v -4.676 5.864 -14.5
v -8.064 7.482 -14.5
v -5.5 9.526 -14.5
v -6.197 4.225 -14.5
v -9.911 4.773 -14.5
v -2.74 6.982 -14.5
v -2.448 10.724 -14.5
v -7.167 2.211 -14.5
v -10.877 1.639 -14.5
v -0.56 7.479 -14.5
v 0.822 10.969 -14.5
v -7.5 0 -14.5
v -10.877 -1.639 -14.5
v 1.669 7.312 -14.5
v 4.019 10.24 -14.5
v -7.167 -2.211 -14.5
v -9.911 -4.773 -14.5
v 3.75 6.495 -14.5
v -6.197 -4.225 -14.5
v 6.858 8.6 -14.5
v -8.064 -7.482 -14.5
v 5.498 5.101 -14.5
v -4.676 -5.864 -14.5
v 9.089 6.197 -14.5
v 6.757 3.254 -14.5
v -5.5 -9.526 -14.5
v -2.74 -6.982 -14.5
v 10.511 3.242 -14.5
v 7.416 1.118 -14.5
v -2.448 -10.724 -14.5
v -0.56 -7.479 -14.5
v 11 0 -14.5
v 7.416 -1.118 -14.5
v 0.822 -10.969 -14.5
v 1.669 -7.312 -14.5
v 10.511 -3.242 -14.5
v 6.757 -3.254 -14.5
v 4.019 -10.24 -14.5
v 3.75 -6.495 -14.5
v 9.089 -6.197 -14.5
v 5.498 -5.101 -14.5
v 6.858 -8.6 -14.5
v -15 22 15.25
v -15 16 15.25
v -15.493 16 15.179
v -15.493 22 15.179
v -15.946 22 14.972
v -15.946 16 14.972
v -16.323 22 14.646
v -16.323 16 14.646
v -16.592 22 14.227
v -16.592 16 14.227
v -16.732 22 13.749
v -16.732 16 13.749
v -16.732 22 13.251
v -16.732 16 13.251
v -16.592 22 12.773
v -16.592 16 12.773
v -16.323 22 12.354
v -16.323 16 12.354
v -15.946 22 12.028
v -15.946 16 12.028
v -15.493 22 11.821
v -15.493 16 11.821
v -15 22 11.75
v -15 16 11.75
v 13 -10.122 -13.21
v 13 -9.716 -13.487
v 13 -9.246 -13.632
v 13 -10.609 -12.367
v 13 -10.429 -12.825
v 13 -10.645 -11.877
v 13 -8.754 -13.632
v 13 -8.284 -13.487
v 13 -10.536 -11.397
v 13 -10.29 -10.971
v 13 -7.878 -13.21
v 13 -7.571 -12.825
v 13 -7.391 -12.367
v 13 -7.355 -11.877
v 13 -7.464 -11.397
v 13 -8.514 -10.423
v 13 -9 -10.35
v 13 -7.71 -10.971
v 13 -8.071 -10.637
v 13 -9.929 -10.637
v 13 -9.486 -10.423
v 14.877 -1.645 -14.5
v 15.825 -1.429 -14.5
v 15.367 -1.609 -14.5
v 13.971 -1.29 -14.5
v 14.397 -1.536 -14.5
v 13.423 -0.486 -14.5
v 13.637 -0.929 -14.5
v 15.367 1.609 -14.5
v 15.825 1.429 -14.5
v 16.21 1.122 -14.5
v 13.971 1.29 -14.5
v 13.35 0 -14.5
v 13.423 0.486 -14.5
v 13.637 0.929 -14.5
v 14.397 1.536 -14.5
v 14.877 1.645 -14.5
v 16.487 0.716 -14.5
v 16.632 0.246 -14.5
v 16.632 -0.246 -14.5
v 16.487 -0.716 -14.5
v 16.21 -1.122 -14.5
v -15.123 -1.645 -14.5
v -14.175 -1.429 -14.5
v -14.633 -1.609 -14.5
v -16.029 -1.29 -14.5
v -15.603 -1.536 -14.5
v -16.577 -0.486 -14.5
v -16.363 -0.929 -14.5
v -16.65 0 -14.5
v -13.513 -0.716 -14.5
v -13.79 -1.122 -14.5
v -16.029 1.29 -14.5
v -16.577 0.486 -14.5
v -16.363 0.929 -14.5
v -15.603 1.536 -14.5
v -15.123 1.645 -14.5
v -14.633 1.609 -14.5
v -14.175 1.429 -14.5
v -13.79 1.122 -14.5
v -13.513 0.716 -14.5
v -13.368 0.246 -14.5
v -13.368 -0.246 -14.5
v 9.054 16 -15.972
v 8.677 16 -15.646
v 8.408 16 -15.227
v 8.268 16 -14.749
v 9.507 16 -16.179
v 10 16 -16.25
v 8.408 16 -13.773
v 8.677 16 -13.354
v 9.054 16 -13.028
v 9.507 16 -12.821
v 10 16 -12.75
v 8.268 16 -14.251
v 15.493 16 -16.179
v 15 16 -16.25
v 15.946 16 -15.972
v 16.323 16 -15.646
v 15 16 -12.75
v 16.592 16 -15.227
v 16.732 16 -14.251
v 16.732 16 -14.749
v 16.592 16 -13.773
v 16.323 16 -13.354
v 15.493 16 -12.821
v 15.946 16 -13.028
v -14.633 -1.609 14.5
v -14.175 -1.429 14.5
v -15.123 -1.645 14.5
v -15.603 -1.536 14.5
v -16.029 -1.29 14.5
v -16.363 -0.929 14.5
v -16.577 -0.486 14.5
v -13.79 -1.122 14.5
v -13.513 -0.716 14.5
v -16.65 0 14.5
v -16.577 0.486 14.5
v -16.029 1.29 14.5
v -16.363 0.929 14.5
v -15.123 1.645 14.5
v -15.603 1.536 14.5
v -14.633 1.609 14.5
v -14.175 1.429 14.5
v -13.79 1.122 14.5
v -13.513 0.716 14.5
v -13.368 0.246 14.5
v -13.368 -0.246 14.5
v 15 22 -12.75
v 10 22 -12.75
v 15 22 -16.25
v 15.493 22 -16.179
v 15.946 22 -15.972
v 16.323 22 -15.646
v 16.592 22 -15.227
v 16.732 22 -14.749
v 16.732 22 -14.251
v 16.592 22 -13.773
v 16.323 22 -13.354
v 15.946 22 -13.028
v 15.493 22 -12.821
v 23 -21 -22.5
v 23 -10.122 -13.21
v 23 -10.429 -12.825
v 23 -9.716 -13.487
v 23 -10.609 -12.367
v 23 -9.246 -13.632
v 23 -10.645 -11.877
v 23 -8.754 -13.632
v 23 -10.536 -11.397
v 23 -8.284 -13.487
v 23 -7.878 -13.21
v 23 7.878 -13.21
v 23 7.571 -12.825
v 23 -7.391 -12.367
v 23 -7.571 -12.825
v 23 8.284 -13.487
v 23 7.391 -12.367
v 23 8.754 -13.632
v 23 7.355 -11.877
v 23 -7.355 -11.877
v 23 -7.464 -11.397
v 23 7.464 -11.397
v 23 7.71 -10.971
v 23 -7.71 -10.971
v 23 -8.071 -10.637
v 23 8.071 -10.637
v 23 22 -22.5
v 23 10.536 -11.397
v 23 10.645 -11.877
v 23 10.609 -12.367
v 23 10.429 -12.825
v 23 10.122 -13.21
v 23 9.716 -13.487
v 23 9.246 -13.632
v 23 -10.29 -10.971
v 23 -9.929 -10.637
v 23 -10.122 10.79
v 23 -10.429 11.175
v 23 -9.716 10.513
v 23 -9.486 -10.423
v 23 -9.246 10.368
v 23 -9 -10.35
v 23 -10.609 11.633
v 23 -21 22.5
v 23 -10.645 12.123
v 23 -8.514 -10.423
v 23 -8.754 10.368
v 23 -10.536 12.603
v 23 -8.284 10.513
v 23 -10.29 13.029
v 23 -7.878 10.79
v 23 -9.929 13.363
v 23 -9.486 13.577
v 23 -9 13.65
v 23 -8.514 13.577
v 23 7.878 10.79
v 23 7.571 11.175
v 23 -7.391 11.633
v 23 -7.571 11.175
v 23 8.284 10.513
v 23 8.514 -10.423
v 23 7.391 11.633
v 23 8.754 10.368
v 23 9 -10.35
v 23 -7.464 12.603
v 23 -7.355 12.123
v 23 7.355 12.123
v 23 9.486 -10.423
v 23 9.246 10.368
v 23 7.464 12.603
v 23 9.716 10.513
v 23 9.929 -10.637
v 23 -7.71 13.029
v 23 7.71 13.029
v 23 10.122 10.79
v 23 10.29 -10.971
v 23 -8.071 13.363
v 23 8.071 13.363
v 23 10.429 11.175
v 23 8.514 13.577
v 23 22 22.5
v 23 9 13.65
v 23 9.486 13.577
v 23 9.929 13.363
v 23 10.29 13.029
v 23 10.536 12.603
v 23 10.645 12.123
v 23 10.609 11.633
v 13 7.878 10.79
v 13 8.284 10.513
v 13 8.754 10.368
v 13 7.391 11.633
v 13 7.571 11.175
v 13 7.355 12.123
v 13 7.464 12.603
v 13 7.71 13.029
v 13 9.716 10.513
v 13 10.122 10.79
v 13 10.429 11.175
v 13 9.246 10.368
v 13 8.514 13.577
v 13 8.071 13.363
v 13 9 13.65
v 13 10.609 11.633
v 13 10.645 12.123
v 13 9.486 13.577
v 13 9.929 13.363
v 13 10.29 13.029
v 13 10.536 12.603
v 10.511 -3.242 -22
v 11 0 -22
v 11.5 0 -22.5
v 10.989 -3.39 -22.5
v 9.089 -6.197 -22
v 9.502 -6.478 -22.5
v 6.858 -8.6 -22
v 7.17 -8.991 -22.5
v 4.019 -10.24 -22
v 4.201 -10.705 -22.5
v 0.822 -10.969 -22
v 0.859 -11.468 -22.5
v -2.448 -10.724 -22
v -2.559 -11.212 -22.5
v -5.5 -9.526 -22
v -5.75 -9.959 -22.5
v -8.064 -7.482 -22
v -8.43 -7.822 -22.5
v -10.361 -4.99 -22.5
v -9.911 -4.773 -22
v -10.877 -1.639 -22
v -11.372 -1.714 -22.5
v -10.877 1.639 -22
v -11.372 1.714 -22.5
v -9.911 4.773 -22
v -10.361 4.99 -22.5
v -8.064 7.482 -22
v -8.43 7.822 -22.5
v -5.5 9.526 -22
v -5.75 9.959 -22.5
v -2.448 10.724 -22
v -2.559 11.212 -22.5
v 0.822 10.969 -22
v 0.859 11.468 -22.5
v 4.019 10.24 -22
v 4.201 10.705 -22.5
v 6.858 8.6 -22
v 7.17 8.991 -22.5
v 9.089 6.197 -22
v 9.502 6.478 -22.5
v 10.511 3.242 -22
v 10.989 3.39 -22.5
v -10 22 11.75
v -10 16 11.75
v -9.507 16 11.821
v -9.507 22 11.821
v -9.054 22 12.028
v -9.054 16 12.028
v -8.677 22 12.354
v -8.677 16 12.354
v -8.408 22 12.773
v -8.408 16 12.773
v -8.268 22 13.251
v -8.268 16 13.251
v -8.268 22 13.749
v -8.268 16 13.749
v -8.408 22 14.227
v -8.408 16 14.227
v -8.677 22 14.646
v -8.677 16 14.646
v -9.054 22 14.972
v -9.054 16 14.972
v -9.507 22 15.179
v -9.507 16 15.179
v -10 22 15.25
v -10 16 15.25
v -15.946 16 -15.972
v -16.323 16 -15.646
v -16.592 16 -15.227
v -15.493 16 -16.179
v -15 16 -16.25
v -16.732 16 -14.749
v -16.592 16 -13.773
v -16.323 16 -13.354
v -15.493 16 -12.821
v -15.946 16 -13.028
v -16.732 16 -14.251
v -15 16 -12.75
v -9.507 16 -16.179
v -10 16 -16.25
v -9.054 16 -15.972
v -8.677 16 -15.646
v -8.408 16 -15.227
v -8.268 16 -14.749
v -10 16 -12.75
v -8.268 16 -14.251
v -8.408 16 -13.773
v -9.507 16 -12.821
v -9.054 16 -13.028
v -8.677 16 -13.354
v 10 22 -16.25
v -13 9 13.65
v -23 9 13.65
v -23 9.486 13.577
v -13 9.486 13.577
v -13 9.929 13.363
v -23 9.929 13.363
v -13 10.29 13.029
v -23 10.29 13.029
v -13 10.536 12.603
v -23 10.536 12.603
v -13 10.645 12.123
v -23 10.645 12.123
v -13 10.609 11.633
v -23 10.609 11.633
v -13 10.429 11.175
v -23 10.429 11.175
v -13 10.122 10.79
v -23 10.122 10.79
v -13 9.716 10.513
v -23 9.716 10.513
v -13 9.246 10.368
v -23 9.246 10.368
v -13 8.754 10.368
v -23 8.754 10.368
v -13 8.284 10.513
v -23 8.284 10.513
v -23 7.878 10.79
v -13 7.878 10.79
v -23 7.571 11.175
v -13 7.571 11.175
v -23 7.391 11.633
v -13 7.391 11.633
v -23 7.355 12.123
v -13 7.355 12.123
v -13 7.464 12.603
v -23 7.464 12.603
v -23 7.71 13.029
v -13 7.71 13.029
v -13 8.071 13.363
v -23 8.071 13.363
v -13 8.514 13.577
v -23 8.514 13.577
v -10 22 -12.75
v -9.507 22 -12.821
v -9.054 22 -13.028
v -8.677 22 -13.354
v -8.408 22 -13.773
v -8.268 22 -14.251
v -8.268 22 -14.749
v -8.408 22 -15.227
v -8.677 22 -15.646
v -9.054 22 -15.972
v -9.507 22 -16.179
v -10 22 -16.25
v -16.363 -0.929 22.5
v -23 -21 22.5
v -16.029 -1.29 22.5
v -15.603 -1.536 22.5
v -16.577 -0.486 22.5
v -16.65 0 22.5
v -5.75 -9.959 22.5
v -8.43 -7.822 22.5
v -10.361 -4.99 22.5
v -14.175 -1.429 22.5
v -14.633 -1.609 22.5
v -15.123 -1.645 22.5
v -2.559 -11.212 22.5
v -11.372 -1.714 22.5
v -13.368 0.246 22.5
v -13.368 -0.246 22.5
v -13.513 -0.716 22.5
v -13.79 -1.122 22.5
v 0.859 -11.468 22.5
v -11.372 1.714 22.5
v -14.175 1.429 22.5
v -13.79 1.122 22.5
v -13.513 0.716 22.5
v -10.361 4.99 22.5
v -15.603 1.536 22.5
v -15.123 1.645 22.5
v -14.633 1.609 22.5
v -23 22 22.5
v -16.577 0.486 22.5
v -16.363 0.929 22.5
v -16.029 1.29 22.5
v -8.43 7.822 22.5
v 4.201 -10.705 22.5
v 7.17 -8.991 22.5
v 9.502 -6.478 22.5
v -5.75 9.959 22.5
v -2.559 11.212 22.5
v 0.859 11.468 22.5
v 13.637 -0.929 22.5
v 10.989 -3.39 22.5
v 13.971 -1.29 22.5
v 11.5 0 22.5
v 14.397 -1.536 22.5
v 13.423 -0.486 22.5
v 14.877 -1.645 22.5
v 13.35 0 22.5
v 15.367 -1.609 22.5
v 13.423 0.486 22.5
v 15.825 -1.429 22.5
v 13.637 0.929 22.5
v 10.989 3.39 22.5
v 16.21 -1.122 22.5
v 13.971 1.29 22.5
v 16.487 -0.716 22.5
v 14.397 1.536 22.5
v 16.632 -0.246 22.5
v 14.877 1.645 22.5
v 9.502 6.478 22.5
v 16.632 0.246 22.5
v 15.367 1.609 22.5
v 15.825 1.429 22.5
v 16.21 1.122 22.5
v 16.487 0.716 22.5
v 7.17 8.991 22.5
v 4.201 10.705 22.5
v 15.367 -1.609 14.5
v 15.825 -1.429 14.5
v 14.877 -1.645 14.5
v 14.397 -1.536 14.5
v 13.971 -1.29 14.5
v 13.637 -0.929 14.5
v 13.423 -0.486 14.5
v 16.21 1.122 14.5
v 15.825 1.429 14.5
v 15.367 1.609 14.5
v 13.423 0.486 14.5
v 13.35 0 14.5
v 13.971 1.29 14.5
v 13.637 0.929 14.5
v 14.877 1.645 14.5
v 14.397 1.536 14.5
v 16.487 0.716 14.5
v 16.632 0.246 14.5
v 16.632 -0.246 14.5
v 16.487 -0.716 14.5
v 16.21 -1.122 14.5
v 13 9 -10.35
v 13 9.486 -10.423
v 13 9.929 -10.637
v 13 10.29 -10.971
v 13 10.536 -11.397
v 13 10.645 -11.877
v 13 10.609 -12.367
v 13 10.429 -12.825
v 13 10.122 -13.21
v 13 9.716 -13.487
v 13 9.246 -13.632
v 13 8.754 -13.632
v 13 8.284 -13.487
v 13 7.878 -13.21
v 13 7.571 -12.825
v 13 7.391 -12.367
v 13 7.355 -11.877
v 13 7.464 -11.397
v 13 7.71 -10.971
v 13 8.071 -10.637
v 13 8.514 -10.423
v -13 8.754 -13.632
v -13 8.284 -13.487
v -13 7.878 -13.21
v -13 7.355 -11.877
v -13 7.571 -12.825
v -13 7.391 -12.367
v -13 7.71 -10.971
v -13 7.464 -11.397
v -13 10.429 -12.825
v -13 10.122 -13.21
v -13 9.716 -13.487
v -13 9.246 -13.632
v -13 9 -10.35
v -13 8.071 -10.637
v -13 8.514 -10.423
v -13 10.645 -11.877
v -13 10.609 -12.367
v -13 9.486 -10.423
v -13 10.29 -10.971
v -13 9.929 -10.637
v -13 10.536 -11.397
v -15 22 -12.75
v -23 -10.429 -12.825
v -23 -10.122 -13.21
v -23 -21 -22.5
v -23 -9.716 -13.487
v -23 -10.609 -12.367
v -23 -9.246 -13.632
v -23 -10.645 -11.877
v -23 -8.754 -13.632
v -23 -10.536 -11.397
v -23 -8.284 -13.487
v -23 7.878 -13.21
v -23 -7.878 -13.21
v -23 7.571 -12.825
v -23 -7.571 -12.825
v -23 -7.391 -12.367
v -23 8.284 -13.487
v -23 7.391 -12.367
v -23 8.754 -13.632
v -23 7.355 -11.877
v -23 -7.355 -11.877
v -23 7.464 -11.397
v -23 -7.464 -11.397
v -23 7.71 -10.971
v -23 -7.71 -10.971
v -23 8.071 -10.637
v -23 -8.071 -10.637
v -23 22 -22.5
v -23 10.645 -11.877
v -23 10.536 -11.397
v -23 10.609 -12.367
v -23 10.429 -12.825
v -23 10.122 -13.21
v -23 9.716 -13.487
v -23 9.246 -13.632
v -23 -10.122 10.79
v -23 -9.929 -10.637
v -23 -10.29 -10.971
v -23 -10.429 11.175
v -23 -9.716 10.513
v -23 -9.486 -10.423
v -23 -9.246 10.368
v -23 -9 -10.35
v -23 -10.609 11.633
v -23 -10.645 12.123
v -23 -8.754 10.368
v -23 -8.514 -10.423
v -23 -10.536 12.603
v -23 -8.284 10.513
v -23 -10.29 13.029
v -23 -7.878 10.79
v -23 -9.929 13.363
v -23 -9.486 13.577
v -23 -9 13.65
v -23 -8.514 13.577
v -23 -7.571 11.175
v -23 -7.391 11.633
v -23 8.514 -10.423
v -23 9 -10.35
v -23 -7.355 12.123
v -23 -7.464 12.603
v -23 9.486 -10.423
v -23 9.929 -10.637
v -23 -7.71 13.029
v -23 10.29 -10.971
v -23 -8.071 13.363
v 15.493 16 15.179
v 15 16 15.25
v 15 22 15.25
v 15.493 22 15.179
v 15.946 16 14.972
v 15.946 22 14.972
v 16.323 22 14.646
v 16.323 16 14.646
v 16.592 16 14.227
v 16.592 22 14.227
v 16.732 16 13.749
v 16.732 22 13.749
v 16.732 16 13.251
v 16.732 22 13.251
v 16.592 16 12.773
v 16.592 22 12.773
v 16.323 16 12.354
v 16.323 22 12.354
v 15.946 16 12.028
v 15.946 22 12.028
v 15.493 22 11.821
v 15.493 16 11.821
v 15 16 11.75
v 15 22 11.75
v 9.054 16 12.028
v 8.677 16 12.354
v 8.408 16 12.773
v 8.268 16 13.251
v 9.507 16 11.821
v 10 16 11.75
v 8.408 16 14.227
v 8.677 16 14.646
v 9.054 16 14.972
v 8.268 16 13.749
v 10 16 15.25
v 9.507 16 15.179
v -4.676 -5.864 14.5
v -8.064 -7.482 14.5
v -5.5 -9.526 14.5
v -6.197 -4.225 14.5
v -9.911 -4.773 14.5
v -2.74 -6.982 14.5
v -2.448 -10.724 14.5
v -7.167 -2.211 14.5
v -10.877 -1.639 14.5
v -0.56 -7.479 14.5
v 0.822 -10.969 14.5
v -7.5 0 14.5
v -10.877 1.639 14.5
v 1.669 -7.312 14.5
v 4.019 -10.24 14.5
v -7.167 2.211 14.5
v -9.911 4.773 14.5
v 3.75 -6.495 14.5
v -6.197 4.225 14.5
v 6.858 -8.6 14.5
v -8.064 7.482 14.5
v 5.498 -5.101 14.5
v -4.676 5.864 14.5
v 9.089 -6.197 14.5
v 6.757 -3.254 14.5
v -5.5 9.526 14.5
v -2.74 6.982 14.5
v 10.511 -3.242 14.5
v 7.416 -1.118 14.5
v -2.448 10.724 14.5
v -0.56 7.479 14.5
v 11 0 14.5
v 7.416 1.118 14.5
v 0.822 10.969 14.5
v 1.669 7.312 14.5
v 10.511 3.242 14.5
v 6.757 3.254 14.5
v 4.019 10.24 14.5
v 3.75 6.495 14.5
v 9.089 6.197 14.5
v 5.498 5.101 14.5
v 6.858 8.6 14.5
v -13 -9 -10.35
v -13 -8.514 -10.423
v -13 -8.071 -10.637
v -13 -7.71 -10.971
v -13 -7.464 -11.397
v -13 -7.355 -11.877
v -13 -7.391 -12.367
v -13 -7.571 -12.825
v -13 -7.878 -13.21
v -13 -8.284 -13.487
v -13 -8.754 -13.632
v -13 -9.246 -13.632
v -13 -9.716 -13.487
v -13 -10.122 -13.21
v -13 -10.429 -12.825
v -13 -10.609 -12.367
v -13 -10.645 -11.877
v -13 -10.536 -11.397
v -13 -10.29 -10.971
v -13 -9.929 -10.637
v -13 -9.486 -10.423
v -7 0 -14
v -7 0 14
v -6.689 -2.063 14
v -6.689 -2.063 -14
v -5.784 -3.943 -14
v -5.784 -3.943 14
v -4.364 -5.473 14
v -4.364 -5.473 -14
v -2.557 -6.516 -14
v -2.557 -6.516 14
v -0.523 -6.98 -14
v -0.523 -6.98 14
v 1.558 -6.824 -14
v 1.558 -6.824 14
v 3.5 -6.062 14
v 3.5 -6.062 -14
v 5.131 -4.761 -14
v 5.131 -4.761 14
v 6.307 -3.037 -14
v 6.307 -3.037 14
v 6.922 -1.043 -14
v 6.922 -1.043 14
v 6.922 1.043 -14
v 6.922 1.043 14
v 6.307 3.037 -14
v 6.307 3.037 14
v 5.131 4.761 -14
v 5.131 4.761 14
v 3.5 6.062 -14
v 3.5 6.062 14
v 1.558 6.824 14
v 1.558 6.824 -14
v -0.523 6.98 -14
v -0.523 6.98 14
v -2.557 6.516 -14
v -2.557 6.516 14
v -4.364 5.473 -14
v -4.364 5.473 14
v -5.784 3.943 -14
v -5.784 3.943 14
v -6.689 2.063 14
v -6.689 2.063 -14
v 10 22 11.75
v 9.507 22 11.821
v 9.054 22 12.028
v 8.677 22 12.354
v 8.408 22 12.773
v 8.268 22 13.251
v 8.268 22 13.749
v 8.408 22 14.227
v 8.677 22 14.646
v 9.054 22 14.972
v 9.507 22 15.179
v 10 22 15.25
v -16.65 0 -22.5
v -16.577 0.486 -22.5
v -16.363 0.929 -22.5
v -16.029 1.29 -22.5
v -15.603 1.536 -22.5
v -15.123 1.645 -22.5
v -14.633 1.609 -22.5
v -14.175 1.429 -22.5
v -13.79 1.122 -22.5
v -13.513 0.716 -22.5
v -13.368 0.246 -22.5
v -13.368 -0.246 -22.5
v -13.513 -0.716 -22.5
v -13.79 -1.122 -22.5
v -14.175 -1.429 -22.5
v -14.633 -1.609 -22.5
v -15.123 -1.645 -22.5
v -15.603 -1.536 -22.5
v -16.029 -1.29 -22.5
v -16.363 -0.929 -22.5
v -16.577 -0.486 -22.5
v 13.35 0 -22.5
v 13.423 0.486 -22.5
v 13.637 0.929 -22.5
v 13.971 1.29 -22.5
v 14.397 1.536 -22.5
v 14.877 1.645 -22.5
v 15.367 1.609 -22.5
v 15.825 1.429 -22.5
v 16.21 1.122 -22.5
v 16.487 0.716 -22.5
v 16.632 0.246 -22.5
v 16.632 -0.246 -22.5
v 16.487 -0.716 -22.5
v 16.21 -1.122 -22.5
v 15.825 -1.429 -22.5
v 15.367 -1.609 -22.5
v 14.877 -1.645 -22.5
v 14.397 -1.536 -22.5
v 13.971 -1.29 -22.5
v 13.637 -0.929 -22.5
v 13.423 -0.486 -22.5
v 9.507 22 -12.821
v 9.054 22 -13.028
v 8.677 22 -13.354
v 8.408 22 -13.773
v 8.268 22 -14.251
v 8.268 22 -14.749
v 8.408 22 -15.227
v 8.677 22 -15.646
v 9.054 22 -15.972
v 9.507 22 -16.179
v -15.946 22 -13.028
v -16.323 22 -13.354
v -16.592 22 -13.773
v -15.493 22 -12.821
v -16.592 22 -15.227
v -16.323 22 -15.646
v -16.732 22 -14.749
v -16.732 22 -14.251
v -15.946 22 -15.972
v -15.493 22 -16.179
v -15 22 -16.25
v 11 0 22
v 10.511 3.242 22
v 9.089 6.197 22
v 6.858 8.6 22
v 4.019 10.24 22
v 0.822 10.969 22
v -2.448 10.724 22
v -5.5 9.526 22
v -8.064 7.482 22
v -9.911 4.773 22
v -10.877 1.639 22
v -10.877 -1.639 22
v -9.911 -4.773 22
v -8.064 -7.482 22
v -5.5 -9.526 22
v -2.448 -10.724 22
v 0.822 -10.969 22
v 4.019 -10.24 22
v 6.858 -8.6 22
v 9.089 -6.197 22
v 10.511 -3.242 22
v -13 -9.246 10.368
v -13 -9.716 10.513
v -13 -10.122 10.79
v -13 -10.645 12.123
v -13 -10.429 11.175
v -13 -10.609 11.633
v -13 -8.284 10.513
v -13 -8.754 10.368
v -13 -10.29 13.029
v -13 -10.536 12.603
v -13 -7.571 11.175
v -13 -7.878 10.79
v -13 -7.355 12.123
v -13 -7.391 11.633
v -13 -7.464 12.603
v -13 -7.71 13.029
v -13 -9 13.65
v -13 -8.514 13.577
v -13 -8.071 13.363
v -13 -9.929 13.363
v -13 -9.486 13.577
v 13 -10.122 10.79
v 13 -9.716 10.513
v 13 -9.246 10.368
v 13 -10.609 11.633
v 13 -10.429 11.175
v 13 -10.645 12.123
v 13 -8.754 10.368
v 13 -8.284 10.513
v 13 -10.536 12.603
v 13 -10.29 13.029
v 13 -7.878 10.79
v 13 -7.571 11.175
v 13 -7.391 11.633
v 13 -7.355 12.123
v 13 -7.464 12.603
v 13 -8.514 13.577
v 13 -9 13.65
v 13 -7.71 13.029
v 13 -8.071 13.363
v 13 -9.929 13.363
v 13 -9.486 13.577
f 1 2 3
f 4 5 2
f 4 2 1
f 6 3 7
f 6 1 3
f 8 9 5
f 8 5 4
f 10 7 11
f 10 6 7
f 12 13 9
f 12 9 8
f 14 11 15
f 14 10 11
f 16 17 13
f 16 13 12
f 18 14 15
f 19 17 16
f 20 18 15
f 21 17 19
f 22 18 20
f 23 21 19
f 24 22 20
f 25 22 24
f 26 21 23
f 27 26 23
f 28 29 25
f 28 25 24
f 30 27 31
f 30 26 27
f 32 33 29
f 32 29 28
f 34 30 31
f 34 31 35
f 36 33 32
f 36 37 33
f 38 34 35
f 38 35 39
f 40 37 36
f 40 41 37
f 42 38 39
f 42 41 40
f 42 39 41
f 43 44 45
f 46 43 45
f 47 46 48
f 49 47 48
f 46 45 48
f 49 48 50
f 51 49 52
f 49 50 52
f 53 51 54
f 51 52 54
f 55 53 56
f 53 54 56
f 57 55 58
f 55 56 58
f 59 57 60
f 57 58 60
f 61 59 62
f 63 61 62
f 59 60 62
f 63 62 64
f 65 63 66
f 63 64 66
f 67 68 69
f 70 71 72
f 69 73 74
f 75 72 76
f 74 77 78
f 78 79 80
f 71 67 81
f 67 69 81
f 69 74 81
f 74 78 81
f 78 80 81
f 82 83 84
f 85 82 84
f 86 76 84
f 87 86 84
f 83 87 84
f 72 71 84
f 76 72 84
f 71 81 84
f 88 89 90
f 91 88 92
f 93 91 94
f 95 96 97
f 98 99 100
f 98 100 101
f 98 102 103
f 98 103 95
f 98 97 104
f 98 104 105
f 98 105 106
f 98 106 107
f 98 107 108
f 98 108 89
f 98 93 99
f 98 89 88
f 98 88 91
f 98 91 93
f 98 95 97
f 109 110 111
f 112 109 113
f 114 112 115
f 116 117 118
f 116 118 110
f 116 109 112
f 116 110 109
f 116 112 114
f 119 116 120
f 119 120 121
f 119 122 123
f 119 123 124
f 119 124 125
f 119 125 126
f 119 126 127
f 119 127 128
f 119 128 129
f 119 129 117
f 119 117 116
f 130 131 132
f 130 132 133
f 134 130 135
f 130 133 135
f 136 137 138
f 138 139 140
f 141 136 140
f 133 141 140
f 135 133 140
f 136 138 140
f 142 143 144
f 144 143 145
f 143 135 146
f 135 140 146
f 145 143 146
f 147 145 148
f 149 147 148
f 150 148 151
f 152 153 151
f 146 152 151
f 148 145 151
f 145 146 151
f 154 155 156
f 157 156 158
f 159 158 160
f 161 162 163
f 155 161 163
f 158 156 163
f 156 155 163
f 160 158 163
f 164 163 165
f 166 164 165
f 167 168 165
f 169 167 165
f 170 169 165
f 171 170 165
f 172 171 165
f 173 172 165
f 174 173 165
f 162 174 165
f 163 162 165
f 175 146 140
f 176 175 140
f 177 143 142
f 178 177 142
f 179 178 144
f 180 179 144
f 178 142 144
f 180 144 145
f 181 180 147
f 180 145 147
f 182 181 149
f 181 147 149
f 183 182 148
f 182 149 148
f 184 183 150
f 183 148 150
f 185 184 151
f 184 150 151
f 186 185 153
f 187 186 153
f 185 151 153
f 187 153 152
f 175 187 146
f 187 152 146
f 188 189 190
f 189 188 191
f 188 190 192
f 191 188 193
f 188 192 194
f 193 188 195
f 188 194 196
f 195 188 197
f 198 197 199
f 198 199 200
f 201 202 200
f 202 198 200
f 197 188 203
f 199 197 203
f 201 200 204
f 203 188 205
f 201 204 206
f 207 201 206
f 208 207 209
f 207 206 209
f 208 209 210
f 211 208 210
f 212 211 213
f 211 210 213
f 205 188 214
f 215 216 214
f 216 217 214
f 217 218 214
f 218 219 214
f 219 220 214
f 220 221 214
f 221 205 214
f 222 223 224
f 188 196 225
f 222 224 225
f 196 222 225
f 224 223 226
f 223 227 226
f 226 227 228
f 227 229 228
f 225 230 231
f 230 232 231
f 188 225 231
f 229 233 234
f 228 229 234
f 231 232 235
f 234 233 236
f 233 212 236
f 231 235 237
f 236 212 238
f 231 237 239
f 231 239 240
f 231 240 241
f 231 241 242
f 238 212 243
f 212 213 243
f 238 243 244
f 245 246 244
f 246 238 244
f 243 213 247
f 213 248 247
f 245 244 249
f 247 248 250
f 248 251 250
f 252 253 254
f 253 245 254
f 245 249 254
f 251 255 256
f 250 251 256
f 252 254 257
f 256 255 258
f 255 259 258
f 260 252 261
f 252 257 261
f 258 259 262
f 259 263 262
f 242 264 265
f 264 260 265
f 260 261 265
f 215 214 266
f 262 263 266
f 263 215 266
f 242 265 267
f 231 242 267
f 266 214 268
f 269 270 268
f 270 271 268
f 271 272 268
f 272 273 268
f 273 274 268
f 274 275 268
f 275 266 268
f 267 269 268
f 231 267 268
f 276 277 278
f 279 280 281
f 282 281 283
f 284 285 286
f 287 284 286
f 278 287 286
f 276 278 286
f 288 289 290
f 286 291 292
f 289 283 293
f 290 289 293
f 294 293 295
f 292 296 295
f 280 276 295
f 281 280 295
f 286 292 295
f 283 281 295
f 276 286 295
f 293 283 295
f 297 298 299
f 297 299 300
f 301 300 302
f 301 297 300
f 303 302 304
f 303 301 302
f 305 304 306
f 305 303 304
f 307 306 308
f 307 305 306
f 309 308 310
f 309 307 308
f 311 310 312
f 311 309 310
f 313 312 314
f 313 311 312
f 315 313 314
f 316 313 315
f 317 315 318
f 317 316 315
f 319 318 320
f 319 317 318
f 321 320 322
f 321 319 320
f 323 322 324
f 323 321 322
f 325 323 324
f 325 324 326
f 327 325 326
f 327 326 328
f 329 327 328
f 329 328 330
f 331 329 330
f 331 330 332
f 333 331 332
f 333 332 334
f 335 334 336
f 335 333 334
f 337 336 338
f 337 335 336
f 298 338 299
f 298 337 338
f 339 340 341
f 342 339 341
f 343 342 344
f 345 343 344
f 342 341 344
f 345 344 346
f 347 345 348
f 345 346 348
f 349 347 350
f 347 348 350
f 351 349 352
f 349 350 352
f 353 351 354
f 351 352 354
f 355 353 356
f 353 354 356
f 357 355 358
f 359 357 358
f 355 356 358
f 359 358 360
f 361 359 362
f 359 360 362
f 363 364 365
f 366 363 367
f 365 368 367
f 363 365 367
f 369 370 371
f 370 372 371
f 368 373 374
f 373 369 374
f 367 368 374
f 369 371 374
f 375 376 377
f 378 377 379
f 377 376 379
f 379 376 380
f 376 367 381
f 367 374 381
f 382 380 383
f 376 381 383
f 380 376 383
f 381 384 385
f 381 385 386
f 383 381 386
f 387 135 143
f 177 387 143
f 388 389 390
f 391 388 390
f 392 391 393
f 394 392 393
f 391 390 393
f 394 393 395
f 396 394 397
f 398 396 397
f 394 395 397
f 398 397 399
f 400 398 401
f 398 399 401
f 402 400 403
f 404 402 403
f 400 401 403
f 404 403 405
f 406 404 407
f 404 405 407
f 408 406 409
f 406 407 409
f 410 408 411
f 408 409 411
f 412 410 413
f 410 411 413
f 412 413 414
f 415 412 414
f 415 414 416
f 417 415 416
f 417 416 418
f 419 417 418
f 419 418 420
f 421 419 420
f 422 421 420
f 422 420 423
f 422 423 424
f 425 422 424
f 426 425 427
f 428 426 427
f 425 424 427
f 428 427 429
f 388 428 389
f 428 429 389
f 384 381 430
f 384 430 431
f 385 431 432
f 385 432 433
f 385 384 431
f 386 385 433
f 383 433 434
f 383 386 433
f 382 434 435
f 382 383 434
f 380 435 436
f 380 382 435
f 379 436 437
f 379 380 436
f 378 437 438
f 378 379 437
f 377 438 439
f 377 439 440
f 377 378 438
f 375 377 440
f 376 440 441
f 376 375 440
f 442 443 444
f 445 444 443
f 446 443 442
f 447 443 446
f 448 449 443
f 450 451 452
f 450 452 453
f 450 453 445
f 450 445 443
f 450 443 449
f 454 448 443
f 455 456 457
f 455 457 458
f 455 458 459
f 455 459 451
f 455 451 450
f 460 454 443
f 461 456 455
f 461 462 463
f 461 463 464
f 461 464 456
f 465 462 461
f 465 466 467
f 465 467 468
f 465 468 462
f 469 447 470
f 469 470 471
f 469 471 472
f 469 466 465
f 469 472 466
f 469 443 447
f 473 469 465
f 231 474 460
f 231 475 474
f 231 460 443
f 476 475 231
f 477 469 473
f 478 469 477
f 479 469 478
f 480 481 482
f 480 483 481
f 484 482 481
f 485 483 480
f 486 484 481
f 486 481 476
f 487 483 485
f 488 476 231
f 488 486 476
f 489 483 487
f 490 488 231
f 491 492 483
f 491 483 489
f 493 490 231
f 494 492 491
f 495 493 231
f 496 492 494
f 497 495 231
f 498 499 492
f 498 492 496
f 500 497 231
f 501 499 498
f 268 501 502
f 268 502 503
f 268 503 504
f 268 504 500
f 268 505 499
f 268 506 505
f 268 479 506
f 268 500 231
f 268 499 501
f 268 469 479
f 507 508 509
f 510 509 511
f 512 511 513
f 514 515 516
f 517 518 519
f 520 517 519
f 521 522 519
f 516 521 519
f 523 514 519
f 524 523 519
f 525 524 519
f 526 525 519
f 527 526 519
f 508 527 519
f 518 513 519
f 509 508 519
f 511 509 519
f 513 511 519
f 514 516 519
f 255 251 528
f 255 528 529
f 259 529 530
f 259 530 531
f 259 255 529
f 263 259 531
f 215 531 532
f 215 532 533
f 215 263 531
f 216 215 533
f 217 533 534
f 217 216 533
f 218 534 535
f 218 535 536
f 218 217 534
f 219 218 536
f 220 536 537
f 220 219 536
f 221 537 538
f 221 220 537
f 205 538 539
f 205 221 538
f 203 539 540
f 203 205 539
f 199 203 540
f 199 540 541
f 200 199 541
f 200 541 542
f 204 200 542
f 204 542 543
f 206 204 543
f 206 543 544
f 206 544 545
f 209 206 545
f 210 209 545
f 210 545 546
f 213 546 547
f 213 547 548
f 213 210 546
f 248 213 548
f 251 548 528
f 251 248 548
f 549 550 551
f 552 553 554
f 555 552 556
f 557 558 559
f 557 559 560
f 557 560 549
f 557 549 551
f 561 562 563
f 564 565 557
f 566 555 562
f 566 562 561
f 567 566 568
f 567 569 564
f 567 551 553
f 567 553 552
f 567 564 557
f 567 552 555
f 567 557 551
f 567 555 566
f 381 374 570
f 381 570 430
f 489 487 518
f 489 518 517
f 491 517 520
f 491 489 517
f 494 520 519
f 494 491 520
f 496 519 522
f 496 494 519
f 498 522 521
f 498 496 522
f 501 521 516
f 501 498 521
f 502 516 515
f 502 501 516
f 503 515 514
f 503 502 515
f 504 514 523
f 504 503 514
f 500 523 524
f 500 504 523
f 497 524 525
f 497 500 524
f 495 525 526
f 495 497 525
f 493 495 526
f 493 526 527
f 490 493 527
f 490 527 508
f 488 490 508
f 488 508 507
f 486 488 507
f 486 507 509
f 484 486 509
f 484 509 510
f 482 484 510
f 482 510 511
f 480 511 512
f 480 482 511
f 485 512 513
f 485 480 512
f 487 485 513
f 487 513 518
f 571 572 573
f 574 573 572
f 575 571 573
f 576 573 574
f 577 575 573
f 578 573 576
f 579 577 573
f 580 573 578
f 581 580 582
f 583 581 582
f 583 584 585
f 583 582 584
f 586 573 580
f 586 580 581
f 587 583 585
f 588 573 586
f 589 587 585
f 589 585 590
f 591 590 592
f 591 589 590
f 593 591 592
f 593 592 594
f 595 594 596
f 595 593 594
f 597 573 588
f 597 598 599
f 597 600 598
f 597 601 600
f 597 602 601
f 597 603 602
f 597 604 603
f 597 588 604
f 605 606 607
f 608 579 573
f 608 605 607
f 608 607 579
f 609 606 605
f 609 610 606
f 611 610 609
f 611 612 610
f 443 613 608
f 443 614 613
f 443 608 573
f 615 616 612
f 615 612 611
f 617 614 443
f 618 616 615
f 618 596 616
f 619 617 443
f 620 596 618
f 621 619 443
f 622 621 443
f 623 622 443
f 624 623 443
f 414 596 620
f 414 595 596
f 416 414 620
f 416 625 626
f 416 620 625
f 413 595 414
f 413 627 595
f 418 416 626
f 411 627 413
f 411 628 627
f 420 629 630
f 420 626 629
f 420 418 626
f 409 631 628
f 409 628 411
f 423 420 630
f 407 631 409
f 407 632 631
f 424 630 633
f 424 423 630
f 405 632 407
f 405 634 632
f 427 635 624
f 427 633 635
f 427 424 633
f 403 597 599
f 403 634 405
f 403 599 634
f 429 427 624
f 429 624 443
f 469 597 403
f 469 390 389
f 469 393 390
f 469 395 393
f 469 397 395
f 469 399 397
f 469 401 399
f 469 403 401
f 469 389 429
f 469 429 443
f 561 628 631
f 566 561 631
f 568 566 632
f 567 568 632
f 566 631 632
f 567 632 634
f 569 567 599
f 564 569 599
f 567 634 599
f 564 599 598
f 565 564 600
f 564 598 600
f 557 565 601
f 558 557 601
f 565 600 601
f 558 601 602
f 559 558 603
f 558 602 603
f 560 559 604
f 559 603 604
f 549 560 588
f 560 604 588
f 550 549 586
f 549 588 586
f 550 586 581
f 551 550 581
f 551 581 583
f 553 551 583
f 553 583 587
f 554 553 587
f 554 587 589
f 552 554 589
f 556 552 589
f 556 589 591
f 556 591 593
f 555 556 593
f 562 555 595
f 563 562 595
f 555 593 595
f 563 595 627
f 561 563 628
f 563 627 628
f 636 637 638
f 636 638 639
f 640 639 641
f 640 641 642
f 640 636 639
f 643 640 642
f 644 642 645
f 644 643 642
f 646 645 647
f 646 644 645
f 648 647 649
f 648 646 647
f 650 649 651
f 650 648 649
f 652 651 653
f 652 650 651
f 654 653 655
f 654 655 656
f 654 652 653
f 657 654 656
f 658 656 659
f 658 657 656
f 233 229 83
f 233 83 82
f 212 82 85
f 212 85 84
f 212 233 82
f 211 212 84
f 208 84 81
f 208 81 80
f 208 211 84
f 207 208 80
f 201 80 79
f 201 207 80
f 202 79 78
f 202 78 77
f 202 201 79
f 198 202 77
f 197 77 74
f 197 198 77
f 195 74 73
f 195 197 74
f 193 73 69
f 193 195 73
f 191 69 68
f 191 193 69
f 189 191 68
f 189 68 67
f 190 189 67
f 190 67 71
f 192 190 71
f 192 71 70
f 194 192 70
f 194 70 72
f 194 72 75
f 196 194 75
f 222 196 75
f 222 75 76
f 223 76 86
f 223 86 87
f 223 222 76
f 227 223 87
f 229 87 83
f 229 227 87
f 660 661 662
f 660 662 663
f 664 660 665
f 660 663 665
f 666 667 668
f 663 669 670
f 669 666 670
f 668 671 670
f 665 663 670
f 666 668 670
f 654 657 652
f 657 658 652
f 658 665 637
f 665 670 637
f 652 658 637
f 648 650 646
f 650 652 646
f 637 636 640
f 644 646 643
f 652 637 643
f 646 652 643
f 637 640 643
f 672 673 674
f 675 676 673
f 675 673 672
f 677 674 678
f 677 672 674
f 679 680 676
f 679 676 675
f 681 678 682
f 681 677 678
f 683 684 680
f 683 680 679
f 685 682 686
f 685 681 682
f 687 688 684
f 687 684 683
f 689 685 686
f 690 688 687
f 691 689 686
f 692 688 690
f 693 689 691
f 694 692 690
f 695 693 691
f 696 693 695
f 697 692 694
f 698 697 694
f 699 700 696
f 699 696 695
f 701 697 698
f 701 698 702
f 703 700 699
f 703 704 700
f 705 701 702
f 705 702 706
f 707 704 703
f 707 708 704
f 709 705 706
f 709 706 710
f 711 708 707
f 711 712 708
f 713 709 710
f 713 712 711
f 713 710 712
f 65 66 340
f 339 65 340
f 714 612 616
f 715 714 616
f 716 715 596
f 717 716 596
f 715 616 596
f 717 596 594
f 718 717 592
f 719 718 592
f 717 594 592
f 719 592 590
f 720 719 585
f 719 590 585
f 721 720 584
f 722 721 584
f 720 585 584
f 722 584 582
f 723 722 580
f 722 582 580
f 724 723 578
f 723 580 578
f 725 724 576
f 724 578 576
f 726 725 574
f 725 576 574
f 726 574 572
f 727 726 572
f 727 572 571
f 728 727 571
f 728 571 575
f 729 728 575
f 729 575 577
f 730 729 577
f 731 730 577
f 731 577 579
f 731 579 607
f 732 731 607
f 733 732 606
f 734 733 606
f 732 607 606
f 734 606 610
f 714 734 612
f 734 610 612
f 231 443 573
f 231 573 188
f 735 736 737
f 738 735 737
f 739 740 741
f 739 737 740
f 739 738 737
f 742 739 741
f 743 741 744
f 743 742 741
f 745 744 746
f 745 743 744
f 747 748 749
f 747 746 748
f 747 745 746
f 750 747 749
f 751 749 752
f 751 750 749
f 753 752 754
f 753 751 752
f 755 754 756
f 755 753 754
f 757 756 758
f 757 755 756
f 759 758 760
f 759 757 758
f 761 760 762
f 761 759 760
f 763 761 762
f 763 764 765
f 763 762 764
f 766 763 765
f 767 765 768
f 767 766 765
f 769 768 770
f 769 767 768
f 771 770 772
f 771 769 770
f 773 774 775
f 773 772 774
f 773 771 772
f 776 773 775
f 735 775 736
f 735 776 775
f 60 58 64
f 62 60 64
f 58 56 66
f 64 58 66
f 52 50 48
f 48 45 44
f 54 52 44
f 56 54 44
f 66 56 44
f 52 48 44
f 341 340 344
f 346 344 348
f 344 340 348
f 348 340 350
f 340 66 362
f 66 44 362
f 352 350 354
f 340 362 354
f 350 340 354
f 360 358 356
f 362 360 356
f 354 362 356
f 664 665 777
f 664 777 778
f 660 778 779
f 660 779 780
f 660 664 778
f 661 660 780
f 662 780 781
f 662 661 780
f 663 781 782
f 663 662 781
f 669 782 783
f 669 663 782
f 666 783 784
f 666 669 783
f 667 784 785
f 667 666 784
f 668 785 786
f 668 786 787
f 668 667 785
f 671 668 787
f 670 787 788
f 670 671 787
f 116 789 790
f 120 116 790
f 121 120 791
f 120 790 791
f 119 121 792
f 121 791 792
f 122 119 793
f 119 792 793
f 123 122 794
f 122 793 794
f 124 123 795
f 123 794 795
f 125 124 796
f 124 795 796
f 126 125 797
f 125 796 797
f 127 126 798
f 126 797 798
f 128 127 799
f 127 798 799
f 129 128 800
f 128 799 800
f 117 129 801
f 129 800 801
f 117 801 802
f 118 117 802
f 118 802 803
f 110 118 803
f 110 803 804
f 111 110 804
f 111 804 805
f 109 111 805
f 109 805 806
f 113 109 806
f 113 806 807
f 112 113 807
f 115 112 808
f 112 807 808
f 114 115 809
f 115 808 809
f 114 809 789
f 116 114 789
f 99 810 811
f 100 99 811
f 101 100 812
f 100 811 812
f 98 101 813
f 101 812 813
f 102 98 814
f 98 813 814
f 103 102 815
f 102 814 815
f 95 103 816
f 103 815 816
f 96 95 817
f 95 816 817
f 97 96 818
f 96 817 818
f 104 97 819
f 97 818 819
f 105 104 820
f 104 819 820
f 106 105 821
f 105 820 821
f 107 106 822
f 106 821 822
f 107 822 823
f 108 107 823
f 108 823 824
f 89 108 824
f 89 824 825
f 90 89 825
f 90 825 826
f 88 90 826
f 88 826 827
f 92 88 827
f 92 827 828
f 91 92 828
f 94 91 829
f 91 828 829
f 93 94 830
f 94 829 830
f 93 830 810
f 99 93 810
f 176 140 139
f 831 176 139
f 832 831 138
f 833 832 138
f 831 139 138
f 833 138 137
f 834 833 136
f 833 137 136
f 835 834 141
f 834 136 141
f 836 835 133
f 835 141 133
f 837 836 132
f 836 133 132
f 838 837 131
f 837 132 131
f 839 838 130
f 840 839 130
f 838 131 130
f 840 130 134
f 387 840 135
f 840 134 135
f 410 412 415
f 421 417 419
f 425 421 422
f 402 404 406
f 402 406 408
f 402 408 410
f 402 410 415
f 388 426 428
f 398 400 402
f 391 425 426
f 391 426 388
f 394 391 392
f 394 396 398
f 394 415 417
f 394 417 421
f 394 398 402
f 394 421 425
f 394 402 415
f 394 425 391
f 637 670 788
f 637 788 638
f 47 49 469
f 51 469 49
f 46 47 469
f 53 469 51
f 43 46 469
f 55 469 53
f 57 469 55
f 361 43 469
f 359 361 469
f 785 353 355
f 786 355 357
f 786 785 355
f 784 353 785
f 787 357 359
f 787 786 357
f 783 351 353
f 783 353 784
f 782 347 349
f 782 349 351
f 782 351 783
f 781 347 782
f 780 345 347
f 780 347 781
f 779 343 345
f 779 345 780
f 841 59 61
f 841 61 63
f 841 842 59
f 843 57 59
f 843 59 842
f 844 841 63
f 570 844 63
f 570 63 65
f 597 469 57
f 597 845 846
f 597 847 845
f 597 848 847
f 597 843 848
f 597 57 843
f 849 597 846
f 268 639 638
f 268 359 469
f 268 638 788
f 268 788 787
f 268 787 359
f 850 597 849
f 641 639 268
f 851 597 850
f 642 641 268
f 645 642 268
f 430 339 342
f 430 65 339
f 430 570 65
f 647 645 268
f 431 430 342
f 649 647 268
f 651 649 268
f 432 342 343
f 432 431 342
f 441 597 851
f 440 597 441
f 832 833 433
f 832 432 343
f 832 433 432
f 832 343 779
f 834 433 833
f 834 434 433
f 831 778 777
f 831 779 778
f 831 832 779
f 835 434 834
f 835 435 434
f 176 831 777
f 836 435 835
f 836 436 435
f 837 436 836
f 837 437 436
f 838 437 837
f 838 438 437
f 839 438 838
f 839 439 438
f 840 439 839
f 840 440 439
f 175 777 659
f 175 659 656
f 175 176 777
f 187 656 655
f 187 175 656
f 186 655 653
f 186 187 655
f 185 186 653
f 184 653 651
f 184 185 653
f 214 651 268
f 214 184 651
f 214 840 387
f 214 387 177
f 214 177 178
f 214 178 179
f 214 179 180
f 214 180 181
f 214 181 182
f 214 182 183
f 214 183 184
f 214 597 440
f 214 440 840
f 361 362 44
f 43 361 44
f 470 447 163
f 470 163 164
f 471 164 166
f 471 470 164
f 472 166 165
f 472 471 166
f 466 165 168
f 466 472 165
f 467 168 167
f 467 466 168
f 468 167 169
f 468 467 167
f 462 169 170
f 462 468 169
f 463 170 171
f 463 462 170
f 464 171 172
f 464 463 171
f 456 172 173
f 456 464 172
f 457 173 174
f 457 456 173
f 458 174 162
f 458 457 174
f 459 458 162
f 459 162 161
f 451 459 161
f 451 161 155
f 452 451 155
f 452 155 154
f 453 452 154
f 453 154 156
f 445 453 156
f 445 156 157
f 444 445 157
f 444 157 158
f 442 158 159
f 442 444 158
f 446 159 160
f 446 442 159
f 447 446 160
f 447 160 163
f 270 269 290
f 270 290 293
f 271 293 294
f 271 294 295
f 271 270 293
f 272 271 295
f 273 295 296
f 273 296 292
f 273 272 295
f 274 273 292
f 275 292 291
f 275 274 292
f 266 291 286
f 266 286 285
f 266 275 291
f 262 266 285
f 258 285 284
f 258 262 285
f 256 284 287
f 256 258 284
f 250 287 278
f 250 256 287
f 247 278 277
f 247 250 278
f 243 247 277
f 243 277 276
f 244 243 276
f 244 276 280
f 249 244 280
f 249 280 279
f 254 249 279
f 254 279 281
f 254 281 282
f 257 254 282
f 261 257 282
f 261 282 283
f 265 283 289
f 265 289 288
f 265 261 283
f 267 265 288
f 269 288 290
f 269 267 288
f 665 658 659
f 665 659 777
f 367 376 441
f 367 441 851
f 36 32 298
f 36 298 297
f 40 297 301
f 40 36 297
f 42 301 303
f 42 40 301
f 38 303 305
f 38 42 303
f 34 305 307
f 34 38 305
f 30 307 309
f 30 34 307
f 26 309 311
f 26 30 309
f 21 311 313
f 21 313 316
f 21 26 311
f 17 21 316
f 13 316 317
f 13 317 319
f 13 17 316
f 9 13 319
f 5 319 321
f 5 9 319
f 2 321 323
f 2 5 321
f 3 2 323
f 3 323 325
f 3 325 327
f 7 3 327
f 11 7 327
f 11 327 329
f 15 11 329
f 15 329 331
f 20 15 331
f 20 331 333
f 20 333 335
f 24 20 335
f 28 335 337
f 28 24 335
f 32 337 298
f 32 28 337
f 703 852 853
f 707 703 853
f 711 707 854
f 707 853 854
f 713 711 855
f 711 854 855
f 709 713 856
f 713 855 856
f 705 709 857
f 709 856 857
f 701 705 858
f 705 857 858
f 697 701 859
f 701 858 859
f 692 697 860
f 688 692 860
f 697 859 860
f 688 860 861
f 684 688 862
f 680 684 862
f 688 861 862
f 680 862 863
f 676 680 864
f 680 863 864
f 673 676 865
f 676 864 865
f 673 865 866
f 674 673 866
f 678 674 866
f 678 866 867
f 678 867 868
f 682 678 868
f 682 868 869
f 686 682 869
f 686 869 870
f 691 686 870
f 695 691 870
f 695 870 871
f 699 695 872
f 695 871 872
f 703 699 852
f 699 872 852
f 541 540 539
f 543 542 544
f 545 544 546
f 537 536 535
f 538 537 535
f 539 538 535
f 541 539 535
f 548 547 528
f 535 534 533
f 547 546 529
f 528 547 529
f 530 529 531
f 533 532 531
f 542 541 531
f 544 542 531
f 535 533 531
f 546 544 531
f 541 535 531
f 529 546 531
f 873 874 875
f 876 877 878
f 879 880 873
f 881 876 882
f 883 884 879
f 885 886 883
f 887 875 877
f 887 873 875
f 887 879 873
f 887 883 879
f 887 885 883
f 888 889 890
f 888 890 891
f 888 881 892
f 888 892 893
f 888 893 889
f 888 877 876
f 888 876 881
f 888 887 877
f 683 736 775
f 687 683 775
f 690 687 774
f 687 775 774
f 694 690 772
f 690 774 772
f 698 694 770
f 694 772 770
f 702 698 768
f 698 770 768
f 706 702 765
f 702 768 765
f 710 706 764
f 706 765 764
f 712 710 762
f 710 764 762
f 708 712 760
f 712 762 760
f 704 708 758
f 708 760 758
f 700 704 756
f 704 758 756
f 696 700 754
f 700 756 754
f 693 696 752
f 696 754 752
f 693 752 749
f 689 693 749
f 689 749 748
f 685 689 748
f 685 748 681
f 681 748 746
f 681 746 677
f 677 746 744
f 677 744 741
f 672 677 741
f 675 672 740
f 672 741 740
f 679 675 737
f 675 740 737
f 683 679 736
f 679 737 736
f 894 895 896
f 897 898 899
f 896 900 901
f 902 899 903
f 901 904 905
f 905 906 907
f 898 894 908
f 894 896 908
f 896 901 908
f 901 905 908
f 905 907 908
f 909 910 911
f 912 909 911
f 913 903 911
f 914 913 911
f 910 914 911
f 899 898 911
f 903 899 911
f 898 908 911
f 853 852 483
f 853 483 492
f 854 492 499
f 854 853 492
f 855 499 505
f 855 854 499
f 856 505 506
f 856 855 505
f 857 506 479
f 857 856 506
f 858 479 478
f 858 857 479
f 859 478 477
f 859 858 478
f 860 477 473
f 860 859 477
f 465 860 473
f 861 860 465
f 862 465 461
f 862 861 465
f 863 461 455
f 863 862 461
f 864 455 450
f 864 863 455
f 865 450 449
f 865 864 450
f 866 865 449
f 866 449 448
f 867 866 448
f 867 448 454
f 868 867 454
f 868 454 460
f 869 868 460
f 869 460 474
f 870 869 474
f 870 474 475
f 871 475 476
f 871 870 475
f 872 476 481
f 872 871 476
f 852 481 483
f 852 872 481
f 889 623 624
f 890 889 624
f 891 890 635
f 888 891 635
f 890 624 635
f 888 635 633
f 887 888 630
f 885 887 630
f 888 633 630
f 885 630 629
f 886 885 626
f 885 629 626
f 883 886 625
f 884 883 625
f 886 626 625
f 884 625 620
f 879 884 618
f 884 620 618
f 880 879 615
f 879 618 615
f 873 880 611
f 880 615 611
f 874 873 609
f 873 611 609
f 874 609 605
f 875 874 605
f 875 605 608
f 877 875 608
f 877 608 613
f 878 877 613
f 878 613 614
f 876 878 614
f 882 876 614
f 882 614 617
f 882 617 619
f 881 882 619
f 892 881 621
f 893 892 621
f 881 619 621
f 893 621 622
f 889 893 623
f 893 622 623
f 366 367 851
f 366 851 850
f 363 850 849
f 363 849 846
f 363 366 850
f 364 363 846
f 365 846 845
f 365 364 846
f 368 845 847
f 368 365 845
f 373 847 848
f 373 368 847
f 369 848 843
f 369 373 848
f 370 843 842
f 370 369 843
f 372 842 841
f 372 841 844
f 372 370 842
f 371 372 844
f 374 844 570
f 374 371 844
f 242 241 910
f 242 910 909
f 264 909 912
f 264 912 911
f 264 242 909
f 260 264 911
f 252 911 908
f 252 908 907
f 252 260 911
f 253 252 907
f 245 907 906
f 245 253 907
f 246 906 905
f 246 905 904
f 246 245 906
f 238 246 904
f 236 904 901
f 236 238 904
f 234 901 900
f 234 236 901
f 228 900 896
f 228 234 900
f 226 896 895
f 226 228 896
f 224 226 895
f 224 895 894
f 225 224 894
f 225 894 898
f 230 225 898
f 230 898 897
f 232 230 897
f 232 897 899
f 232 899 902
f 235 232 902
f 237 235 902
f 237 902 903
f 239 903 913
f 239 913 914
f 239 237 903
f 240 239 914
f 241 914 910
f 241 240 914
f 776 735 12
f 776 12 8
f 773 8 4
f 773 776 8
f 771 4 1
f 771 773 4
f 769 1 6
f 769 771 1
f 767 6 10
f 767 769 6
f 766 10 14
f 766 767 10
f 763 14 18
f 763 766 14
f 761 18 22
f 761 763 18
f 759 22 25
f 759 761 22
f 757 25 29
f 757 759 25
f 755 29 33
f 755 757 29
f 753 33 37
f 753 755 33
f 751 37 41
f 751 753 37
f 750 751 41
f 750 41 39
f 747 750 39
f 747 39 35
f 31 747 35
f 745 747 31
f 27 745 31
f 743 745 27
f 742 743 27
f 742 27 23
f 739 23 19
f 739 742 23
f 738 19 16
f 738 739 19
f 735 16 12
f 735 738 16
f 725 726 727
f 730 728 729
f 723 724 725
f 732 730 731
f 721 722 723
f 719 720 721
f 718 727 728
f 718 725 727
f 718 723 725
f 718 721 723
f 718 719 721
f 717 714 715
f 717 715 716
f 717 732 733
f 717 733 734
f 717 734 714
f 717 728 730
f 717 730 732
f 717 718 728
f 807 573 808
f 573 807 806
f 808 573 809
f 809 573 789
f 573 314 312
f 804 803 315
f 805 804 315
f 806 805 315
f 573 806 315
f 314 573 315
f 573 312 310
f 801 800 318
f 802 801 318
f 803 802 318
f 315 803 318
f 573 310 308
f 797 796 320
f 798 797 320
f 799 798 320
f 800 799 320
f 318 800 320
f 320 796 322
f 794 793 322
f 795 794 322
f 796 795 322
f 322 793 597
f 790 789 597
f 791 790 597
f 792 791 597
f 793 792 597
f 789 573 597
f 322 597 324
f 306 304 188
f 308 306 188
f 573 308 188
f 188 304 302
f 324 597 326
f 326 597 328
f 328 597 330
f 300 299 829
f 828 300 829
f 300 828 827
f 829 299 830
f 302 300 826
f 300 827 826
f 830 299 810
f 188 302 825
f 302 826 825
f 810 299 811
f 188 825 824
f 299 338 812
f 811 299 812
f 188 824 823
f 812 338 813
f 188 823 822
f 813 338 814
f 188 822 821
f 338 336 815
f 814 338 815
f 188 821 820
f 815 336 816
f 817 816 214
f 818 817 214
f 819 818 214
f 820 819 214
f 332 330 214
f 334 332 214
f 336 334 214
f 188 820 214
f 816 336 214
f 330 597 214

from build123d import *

# Parameters (mm, degrees)
SKETCH1_W           = 46
SKETCH1_H           = 32
SKETCH1_R           = 7
BOSS_EXTRUDE1_DEPTH = 22.5
SKETCH2_R           = 11
CUT_EXTRUDE1_DEPTH  = 8
CUT_EXTRUDE2_START  = -8
SKETCH3_R           = 11
CUT_EXTRUDE2_DEPTH  = 8
SKETCH4_R           = 1.65
CUT_EXTRUDE3_DEPTH  = 10
CHAMFER1_SIZE       = 0.5
SKETCH5_W           = 46
SKETCH5_H           = 45
BOSS_EXTRUDE2_DEPTH = 6
SKETCH6_R           = 1.65
CUT_EXTRUDE4_DEPTH  = 8
SKETCH8_W           = 46
SKETCH8_H           = 45
BOSS_EXTRUDE3_DEPTH = 5


with BuildPart() as part:
    # Sketch1 → Boss-Extrude1 (new, symmetric)
    with BuildSketch(Plane.XY):
        Rectangle(SKETCH1_W, SKETCH1_H)
        with Locations(Location((0, 0, 0), (0, 0, 180))):
            Circle(SKETCH1_R, mode=Mode.SUBTRACT)
    extrude(amount=BOSS_EXTRUDE1_DEPTH, both=True)

    # Sketch2 → Cut-Extrude1 (cut)
    with BuildSketch(Plane.XY.offset(22.5)):
        Circle(SKETCH2_R)
    extrude(amount=-CUT_EXTRUDE1_DEPTH, mode=Mode.SUBTRACT)

    # Sketch3 → Cut-Extrude2 (cut)
    with BuildSketch(Plane(origin=(0, 0, -22.5), x_dir=(-1, 0, 0), z_dir=(0, 0, -1)).offset(CUT_EXTRUDE2_START)):
        with Locations(Location((0, 0, 0), (0, 0, 180))):
            Circle(SKETCH3_R)
    extrude(amount=CUT_EXTRUDE2_DEPTH, mode=Mode.SUBTRACT)

    # Sketch4 → Cut-Extrude3 (cut)
    with BuildSketch(Plane.ZY.offset(23)):
        with Locations((12, -9)):
            Circle(SKETCH4_R)
        with Locations((12, 9)):
            Circle(SKETCH4_R)
        with Locations((-12, -9)):
            Circle(SKETCH4_R)
        with Locations((-12, 9)):
            Circle(SKETCH4_R)
    cut_extrude3 = extrude(amount=-CUT_EXTRUDE3_DEPTH, mode=Mode.SUBTRACT)

    # Mirror1: Cut-Extrude3 across plane
    add(cut_extrude3.mirror(Plane(origin=(0, 0, 0), x_dir=(0, 0, 1), z_dir=(1, 0, 0))), mode=Mode.SUBTRACT)

    # Chamfer1
    chamfer1_edges = [part.edges().sort_by_distance(p)[0] for p in [
        (7, 0, 14.5),
        (-11, 0, 22.5),
        (7, 0, -14.5),
        (-11, 0, -22.5),
    ]]
    chamfer(chamfer1_edges, length=CHAMFER1_SIZE)

    # Sketch5 → Boss-Extrude2 (add)
    with BuildSketch(Plane(origin=(0, 16, 0), x_dir=(1, 0, 0), z_dir=(0, 1, 0))):
        Rectangle(SKETCH5_W, SKETCH5_H)
        with BuildLine():
            Line((-10, -15.25), (-15, -15.25))
            ThreePointArc((-15, -15.25), (-16.75, -13.5), (-15, -11.75))
            Line((-15, -11.75), (-10, -11.75))
            ThreePointArc((-10, -11.75), (-8.25, -13.5), (-10, -15.25))
        make_face(mode=Mode.SUBTRACT)
        with BuildLine():
            Line((10, 16.25), (15, 16.25))
            ThreePointArc((15, 16.25), (16.75, 14.5), (15, 12.75))
            Line((15, 12.75), (10, 12.75))
            ThreePointArc((10, 12.75), (8.25, 14.5), (10, 16.25))
        make_face(mode=Mode.SUBTRACT)
        with BuildLine():
            Line((15, -11.75), (10, -11.75))
            ThreePointArc((10, -11.75), (8.25, -13.5), (10, -15.25))
            Line((10, -15.25), (15, -15.25))
            ThreePointArc((15, -15.25), (16.75, -13.5), (15, -11.75))
        make_face(mode=Mode.SUBTRACT)
        with BuildLine():
            Line((-15, 12.75), (-10, 12.75))
            ThreePointArc((-10, 12.75), (-8.25, 14.5), (-10, 16.25))
            Line((-10, 16.25), (-15, 16.25))
            ThreePointArc((-15, 16.25), (-16.75, 14.5), (-15, 12.75))
        make_face(mode=Mode.SUBTRACT)
    extrude(amount=BOSS_EXTRUDE2_DEPTH)

    # Sketch6 → Cut-Extrude4 (cut)
    with BuildSketch(Plane(origin=(0, 0, -22.5), x_dir=(-1, 0, 0), z_dir=(0, 0, -1))):
        with Locations((15, 0)):
            Circle(SKETCH6_R)
        with Locations((-15, 0)):
            Circle(SKETCH6_R)
    cut_extrude4 = extrude(amount=-CUT_EXTRUDE4_DEPTH, mode=Mode.SUBTRACT)

    # Mirror2: Cut-Extrude4 across plane
    add(cut_extrude4.mirror(Plane.XY), mode=Mode.SUBTRACT)

    # Sketch8 → Boss-Extrude3 (add)
    with BuildSketch(Plane.XZ.offset(16)):
        Rectangle(SKETCH8_W, SKETCH8_H)
    extrude(amount=BOSS_EXTRUDE3_DEPTH)


solid = part.part
